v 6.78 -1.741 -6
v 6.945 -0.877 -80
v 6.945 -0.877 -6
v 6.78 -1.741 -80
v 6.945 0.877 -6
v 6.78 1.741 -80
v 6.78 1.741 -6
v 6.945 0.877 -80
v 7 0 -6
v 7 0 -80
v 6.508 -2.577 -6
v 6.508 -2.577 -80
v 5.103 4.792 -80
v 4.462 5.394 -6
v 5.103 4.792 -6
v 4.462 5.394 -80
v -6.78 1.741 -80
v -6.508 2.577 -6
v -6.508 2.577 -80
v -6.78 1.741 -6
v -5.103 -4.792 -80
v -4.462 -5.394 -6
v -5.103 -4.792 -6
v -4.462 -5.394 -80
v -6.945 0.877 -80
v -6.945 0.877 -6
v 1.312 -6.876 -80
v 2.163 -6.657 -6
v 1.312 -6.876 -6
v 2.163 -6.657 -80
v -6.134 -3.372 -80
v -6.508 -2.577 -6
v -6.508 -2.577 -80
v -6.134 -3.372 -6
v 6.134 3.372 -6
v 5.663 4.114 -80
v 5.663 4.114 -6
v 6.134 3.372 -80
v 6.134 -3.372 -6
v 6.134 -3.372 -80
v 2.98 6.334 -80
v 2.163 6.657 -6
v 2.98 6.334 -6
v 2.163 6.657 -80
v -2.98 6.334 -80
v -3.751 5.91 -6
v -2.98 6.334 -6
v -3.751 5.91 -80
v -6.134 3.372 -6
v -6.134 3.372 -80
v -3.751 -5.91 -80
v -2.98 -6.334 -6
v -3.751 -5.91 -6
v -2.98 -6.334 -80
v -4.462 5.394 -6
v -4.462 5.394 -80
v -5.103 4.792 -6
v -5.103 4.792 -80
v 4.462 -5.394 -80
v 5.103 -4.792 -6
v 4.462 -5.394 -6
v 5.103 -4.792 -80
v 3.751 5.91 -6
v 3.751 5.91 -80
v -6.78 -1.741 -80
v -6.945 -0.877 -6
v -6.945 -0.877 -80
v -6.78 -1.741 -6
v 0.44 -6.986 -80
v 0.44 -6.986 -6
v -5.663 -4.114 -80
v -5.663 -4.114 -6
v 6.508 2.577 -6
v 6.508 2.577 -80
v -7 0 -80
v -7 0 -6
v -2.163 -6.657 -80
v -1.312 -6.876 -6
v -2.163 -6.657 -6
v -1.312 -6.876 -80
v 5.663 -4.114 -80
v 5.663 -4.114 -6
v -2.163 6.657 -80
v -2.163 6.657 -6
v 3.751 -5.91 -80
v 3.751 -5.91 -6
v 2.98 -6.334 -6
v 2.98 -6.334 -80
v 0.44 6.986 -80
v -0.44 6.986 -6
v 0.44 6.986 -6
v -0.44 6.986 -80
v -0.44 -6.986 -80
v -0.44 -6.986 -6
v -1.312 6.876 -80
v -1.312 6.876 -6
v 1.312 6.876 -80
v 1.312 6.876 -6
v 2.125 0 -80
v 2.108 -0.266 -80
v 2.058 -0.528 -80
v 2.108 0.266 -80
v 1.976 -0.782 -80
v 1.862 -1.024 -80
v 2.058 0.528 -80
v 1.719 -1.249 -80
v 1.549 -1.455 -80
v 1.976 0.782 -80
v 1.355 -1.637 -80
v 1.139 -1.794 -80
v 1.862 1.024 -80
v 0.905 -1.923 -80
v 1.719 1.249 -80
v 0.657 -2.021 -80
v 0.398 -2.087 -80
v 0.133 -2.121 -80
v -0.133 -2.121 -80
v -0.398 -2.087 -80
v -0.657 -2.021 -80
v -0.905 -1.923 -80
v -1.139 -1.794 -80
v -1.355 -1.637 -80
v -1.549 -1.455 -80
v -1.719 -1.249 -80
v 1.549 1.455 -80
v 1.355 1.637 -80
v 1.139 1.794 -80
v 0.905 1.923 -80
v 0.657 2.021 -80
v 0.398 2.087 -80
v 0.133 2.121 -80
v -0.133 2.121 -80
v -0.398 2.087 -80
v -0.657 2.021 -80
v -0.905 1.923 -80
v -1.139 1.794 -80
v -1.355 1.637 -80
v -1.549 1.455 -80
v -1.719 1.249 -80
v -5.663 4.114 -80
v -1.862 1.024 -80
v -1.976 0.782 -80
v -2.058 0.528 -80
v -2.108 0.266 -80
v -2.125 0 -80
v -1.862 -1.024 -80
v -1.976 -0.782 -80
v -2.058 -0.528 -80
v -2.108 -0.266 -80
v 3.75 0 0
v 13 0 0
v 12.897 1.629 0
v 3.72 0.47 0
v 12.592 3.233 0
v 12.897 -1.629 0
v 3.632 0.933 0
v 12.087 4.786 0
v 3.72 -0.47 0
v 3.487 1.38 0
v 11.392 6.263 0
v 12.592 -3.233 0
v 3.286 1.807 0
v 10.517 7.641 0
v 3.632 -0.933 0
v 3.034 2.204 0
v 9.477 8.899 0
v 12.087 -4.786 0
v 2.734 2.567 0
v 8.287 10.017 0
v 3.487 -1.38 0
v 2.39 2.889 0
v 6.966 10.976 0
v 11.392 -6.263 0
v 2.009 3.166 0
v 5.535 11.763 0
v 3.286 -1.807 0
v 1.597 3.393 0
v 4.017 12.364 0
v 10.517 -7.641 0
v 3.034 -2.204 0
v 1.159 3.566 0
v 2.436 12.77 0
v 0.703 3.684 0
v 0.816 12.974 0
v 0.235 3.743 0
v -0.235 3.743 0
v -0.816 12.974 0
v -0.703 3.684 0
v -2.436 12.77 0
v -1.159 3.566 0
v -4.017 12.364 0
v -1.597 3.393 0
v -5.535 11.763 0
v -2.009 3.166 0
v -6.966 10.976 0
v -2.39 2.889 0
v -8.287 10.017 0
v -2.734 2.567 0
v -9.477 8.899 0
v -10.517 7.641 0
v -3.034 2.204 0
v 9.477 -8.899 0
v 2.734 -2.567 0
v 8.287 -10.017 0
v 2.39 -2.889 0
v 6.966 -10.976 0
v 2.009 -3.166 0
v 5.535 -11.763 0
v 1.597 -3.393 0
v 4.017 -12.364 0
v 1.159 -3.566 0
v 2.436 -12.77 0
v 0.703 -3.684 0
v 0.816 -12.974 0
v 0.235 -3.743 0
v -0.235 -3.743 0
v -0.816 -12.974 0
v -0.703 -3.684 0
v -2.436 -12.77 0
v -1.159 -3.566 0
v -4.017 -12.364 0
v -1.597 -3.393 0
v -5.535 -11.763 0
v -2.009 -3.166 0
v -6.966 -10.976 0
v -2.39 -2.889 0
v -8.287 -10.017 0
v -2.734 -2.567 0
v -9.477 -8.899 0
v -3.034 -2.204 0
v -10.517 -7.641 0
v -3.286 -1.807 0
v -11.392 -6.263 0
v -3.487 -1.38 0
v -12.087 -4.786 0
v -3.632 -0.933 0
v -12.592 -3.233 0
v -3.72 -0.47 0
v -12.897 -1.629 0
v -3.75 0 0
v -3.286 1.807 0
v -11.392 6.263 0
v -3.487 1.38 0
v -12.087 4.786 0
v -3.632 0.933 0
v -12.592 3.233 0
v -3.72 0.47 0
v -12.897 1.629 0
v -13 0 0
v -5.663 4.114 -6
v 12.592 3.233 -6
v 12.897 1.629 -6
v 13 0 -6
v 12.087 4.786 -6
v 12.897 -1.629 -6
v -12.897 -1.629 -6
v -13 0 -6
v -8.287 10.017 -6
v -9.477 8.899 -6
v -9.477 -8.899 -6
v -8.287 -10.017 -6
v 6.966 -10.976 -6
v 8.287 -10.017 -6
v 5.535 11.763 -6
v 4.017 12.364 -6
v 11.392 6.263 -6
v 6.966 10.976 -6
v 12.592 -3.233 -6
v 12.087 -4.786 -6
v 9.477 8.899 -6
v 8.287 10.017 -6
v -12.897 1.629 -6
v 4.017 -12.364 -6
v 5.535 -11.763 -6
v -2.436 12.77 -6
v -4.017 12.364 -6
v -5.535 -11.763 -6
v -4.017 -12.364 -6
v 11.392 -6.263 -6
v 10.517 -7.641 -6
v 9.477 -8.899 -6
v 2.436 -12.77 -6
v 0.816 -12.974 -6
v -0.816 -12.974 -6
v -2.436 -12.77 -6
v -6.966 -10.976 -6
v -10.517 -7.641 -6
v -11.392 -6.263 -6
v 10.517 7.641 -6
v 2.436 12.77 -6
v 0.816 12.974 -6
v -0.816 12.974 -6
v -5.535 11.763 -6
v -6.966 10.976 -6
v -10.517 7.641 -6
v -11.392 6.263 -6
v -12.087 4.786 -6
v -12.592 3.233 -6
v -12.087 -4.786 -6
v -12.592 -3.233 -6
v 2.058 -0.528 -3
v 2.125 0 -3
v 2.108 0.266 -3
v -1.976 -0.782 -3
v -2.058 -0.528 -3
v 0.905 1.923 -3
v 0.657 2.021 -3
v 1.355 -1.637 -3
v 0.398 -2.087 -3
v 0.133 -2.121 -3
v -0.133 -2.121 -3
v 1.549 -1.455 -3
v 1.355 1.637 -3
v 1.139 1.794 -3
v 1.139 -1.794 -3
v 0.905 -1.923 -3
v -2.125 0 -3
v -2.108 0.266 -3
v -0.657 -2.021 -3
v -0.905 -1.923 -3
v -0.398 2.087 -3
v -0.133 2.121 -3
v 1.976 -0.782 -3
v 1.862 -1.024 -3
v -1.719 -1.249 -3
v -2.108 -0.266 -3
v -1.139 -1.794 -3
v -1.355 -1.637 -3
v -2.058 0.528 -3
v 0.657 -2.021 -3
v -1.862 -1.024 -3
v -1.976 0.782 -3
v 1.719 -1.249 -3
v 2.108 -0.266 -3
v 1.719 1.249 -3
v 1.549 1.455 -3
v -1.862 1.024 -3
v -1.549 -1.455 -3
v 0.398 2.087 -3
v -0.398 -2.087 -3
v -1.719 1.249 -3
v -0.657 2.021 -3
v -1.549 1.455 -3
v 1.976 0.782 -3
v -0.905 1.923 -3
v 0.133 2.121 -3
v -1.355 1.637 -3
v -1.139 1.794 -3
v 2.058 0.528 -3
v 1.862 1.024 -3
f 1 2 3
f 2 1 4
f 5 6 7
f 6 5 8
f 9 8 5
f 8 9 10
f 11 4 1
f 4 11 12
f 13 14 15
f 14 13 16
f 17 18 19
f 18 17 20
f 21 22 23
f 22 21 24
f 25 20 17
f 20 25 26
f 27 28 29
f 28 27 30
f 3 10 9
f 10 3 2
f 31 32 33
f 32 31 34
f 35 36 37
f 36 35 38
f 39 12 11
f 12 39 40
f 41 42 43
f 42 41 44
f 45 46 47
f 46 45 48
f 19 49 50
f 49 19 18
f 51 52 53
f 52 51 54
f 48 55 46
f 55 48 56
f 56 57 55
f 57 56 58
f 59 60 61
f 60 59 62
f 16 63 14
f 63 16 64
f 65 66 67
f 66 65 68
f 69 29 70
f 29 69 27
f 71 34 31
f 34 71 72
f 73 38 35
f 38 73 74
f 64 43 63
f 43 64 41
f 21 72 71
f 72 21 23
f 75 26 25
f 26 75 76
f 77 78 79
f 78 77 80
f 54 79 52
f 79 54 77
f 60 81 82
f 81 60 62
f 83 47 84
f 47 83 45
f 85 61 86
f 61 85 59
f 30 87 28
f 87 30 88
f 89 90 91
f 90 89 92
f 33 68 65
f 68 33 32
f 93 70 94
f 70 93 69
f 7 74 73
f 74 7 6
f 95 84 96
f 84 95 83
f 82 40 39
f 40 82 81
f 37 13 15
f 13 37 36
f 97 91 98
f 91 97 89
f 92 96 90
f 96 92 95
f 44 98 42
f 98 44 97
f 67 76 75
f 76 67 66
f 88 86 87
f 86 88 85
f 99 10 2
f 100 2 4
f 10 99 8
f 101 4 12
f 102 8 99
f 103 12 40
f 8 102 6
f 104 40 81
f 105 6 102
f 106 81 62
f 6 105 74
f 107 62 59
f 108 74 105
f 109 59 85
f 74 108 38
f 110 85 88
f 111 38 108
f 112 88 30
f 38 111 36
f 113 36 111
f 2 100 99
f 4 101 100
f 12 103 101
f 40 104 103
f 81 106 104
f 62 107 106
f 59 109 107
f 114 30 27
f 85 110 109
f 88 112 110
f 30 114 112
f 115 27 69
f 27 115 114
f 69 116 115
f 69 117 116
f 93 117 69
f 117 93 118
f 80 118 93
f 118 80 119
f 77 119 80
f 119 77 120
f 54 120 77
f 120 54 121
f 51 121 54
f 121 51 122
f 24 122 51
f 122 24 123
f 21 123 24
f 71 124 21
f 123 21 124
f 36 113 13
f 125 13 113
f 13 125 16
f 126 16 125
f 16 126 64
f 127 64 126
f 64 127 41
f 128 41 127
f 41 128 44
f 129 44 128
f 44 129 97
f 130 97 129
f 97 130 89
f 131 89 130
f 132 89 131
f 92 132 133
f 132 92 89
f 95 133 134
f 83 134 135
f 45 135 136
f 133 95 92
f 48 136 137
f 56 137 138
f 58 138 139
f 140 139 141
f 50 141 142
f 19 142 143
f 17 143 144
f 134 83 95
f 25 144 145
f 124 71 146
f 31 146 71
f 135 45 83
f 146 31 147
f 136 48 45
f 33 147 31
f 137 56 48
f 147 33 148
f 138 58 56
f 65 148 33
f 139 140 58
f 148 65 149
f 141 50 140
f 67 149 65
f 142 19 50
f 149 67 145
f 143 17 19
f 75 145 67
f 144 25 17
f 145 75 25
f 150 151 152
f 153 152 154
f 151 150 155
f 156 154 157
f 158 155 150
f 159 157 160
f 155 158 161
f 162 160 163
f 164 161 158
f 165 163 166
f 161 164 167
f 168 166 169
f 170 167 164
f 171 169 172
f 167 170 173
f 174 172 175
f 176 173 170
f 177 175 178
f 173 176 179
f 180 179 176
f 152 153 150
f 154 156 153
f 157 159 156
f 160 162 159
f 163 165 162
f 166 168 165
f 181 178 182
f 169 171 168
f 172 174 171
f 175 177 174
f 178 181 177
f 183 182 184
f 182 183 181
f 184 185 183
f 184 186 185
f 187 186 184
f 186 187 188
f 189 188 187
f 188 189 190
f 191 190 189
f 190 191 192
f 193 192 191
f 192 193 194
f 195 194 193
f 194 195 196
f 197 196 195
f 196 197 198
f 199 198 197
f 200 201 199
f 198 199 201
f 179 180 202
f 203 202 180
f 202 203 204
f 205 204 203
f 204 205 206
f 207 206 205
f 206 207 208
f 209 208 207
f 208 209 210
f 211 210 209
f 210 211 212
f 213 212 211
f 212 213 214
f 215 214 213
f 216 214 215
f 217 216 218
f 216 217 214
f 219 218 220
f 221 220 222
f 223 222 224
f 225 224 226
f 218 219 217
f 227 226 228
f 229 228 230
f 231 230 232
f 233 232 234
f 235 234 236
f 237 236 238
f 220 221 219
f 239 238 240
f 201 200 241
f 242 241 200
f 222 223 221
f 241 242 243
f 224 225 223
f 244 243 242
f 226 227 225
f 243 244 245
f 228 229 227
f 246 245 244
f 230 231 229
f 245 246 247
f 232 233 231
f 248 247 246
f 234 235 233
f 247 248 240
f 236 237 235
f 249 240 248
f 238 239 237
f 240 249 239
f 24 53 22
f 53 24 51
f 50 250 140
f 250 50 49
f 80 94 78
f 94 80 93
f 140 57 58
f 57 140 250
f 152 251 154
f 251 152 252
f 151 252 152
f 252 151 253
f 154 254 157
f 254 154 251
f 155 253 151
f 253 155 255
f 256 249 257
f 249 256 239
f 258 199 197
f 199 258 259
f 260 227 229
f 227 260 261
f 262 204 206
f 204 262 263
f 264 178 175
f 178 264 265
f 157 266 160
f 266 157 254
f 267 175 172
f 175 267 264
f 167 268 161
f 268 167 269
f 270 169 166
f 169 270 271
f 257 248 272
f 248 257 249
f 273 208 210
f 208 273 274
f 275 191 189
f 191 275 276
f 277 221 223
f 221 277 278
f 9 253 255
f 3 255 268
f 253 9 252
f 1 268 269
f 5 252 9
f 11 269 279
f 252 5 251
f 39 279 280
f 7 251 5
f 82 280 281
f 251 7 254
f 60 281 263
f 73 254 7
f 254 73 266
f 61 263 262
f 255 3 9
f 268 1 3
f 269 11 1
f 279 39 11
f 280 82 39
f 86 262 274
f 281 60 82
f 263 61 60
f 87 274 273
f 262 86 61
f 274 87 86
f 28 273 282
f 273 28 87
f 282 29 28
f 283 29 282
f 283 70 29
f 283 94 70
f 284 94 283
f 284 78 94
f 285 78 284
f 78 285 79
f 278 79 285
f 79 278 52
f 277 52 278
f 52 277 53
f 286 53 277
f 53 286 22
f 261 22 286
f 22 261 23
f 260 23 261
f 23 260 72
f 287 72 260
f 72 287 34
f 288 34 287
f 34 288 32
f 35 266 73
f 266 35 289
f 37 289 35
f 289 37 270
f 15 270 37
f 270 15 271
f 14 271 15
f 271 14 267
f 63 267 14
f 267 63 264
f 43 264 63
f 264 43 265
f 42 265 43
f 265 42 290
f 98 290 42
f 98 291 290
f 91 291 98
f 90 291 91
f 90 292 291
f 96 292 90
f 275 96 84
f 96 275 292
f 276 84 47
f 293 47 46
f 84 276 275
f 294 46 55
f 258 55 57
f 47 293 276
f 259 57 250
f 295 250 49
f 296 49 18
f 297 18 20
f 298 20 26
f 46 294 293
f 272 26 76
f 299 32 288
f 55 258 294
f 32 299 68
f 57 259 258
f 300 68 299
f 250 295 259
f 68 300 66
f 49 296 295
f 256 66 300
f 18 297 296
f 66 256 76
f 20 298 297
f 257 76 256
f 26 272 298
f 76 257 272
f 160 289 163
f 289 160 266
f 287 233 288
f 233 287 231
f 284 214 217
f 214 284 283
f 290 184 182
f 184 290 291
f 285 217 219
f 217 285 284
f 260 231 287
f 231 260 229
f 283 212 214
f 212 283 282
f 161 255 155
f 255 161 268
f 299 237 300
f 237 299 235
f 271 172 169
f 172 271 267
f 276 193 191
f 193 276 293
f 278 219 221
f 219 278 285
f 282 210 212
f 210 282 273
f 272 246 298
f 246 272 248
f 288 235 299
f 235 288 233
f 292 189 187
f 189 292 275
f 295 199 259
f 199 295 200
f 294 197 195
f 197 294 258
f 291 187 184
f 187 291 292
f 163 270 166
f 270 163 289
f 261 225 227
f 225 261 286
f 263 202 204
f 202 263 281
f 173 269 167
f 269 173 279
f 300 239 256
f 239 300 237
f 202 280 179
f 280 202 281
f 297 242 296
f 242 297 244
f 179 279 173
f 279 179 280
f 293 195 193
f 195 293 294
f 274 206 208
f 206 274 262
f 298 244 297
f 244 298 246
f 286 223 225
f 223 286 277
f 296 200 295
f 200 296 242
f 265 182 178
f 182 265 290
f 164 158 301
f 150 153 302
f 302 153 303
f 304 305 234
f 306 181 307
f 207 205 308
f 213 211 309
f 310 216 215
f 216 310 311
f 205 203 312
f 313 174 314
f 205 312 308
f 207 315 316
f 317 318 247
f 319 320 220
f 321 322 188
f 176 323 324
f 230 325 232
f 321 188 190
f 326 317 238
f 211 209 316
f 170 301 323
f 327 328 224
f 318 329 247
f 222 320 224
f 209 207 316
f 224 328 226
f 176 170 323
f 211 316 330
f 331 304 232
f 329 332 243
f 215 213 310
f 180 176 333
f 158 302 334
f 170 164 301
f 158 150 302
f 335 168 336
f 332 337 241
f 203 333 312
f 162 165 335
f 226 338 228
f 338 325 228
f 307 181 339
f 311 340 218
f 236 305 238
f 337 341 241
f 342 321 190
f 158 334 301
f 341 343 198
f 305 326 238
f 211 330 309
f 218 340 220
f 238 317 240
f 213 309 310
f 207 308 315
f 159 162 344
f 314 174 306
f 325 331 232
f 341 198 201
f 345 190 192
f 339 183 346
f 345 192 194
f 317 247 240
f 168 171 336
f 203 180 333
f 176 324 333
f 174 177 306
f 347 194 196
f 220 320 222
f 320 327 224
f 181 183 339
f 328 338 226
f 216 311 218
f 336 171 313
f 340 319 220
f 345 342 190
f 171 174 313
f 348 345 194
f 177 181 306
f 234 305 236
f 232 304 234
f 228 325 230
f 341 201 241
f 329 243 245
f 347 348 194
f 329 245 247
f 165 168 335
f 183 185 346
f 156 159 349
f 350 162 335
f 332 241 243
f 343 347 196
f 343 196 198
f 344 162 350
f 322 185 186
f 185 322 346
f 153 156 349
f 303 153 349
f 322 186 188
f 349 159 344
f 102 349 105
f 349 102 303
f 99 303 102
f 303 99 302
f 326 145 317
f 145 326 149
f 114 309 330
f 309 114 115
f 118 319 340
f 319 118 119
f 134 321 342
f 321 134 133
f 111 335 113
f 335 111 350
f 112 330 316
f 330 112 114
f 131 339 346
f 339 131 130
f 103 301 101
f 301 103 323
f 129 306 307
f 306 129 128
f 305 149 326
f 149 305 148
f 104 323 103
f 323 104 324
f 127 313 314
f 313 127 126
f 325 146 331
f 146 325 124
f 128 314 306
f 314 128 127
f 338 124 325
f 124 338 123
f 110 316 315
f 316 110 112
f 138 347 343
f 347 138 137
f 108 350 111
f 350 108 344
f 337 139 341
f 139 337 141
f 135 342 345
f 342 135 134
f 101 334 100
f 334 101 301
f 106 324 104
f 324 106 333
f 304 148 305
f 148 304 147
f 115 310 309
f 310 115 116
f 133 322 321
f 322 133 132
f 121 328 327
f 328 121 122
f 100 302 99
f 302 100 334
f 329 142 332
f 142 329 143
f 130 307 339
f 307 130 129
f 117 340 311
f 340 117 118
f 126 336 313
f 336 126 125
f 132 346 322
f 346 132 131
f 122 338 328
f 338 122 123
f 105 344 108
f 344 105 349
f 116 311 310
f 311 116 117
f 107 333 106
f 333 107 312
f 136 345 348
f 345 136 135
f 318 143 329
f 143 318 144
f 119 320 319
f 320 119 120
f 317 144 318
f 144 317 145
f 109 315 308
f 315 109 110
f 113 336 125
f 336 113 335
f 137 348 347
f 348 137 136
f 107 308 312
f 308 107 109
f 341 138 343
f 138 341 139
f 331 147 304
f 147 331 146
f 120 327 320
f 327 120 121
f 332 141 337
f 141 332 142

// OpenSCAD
$fn = 50;


difference() {
	union() {
		translate(v = [0, 0, -80.0000000000]) {
			cylinder(h = 80, r = 7.0000000000);
		}
		translate(v = [0, 0, -6.0000000000]) {
			cylinder(h = 6, r = 13.0000000000);
		}
	}
	union() {
		translate(v = [0, 0, 0]) {
			rotate(a = [0, 0, 0]) {
				difference() {
					union() {
						#translate(v = [0, 0, -80.0000000000]) {
							cylinder(h = 80, r = 2.0000000000);
						}
						#translate(v = [0, 0, -3]) {
							cylinder(h = 3, r = 7.0000000000, r1 = 2.1250000000, r2 = 3.7500000000);
						}
						#translate(v = [0, 0, -80.0000000000]) {
							cylinder(h = 80, r = 2.1250000000);
						}
						#translate(v = [0, 0, -80.0000000000]) {
							cylinder(h = 80, r = 2.0000000000);
						}
					}
					union();
				}
			}
		}
	}
}
